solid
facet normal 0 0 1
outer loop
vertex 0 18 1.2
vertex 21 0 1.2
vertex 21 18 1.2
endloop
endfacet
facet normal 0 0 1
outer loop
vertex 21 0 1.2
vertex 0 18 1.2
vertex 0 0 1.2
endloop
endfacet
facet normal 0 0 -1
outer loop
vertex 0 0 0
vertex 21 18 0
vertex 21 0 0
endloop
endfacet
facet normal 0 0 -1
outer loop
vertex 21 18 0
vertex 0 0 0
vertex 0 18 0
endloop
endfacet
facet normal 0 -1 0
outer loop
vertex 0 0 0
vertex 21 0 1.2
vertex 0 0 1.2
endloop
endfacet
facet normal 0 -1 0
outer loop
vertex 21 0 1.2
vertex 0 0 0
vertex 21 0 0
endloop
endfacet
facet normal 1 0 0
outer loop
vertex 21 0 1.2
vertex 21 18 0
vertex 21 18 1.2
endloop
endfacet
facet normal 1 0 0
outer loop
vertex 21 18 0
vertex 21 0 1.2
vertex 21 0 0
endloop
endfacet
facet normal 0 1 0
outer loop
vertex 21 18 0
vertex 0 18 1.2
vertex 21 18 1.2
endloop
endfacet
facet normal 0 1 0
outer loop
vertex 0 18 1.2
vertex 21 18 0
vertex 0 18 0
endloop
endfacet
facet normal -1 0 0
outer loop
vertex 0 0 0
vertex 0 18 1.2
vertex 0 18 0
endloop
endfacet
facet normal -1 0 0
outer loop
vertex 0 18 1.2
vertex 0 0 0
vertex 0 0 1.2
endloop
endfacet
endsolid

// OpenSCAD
$fn = 64;

pcb_x = 21.0;
pcb_y = 18.0;
pcb_th = 1.2;

cube([pcb_x, pcb_y, pcb_th], center = false);
